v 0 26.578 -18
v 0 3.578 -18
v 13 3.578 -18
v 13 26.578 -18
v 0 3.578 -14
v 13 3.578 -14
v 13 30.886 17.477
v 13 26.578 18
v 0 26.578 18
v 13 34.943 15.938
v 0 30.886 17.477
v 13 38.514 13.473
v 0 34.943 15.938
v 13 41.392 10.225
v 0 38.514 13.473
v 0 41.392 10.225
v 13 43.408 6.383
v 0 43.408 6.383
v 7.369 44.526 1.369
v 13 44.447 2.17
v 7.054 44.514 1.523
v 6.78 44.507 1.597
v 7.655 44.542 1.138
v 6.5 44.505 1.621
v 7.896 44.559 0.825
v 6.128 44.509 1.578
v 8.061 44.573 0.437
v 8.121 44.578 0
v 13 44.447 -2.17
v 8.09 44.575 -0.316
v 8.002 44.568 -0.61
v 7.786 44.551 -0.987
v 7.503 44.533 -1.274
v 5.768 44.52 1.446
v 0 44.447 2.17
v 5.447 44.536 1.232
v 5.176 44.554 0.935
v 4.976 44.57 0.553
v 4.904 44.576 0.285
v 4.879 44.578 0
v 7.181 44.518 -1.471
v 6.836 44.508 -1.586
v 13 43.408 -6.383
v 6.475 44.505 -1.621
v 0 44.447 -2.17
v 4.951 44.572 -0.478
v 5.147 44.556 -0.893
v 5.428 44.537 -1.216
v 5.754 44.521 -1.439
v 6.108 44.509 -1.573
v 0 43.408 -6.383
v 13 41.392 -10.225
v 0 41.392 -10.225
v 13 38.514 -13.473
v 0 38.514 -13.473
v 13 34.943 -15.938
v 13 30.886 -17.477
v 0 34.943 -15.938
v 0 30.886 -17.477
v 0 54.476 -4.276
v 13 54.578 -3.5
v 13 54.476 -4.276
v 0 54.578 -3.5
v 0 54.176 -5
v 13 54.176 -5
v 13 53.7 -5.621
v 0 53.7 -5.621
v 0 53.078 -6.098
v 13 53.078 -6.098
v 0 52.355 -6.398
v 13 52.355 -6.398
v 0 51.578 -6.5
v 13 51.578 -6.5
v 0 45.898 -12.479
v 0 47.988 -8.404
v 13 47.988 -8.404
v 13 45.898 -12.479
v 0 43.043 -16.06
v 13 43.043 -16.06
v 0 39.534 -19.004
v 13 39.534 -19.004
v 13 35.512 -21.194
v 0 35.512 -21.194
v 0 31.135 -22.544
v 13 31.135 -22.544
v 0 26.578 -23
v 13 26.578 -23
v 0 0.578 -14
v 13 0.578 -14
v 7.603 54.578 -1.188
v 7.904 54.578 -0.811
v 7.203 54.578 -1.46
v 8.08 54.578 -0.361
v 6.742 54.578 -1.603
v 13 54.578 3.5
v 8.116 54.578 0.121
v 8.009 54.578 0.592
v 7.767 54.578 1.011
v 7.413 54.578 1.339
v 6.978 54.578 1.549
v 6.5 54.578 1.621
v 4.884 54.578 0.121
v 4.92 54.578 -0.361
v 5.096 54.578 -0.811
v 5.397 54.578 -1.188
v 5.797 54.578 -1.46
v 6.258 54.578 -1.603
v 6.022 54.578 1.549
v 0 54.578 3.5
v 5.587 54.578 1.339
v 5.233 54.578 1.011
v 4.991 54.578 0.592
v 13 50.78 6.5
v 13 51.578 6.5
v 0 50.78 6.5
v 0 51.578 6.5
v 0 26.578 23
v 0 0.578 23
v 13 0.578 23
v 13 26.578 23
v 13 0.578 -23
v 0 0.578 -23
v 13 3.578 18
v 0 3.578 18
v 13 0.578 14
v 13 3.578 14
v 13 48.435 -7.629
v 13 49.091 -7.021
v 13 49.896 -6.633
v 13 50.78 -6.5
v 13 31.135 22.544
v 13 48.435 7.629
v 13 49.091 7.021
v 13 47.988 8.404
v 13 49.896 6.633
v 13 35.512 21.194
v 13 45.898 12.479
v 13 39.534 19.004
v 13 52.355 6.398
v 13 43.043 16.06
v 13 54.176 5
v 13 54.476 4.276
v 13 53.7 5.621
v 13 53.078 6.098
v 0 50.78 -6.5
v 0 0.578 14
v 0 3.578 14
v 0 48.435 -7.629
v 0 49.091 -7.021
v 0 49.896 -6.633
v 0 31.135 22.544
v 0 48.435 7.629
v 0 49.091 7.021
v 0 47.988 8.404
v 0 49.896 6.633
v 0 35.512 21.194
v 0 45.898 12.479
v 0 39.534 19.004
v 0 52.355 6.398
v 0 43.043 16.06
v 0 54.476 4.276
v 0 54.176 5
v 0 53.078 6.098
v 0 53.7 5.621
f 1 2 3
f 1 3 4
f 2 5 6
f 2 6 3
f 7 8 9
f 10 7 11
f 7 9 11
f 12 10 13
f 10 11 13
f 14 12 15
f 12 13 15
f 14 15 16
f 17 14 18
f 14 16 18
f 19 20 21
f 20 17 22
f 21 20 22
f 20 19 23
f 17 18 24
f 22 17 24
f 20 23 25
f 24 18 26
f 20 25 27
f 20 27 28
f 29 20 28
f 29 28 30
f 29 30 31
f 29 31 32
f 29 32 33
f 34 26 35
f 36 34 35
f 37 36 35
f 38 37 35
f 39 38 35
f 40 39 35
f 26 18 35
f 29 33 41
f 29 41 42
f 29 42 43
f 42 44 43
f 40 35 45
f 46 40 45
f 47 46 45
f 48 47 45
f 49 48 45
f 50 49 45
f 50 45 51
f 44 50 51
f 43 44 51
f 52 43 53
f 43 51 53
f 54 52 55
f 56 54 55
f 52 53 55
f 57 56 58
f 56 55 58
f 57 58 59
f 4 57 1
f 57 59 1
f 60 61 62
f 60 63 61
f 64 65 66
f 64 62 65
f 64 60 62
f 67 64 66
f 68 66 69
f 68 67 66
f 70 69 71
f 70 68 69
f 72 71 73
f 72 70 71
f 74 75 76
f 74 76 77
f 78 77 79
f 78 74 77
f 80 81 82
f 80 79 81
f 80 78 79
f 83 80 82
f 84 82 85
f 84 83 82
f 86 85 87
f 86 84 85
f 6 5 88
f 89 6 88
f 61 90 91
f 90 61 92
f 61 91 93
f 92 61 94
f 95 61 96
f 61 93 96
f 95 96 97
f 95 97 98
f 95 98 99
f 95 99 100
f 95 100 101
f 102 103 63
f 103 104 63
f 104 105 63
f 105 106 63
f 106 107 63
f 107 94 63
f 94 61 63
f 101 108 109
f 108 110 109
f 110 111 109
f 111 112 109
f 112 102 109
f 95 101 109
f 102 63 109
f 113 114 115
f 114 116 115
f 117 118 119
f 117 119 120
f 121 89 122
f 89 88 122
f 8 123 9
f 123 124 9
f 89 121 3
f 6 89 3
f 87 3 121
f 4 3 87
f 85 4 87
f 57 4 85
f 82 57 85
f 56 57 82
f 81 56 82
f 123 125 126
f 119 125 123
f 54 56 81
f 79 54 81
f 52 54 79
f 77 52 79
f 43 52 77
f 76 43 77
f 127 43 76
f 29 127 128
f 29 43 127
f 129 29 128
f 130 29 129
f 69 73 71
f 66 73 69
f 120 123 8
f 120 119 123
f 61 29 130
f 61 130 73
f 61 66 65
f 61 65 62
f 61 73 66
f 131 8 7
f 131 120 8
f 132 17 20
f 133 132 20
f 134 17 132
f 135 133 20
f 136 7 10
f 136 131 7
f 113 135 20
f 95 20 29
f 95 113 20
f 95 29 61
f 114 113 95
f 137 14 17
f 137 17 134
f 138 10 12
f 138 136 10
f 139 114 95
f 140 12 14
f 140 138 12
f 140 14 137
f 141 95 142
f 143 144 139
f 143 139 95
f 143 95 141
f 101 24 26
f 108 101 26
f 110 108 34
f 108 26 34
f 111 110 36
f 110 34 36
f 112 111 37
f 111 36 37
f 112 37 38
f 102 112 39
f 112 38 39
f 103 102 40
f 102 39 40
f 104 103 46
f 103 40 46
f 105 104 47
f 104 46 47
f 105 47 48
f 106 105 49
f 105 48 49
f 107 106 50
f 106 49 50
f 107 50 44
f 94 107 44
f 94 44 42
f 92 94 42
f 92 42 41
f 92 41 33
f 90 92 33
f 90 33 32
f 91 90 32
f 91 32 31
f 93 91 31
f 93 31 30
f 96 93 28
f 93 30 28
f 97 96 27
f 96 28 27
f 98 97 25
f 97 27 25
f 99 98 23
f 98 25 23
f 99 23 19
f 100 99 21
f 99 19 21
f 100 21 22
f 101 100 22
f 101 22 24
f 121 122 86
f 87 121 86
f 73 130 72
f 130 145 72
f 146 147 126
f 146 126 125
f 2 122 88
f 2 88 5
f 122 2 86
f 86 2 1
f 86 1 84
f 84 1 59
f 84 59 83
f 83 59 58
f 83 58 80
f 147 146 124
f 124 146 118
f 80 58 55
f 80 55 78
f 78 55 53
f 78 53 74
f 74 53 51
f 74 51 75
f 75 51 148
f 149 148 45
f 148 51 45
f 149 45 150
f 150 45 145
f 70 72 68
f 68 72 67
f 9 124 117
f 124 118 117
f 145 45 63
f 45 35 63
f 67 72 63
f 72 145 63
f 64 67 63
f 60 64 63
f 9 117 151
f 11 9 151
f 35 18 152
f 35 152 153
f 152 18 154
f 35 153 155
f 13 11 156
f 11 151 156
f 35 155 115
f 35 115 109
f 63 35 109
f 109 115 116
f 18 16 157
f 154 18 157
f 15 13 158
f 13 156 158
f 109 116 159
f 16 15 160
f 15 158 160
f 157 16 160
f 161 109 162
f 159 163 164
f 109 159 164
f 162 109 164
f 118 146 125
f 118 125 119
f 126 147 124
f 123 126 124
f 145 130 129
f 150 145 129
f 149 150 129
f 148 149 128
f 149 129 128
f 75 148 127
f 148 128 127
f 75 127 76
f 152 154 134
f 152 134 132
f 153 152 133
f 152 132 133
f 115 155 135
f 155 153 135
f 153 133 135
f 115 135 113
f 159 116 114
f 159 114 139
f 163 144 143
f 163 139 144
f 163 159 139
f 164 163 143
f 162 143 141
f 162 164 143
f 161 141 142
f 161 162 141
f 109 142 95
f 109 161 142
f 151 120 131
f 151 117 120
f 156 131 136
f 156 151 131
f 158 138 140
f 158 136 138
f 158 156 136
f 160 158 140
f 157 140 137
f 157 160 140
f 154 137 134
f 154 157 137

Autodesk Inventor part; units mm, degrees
ref_plane "YZ Plane" through (0, 0, 0) normal (1, 0, 0) x (0, 1, 0)
ref_plane "XZ Plane" through (0, 0, 0) normal (0, 1, 0) x (-1, 0, 0)
ref_plane "XY Plane" through (0, 0, 0) normal (0, 0, 1) x (1, 0, 0)
sketch "Szkic1" plane through (0, 0, 0) normal (1, 0, 0) x (0, 1, 0)
  line L0 (3.5782, 14) -> (0.5782, 14)
  line L1 (0.5782, 14) -> (0.5782, 23)
  line L2 (0.5782, 23) -> (26.5782, 23)
  arc A0 (49.5782, 0) -> (26.5782, 23) centre (26.5782, 0) ccw
  line L3 (3.5782, 14) -> (3.5782, 18)
  line L4 (3.5782, 18) -> (26.5782, 18)
  arc A1 (44.5782, 0) -> (26.5782, 18) centre (26.5782, 0) ccw
  line L5 (3.5782, -14) -> (0.5782, -14)
  line L6 (0.5782, -14) -> (0.5782, -23)
  line L7 (0.5782, -23) -> (26.5782, -23)
  arc A2 (26.5782, -23) -> (49.5782, 0) centre (26.5782, 0) ccw
  line L8 (3.5782, -14) -> (3.5782, -18)
  line L9 (3.5782, -18) -> (26.5782, -18)
  arc A3 (26.5782, -18) -> (44.5782, 0) centre (26.5782, 0) ccw
  line L10 (51.5782, 6.5) -> (44.5782, 6.5)
  line L11 (44.5782, 6.5) -> (44.5782, -6.5)
  line L12 (44.5782, -6.5) -> (51.5782, -6.5)
  line L13 (54.5782, -3.5) -> (54.5782, 3.5)
  arc A4 (54.5782, 3.5) -> (51.5782, 6.5) centre (51.5782, 3.5) ccw
  arc A5 (51.5782, -6.5) -> (54.5782, -3.5) centre (51.5782, -3.5) ccw
  point P0 (0, 0)
  point P1 (2.0782, 14)
  point P2 (3.5782, 16)
  point P3 (2.0782, -14)
  point P4 (0.5782, 18.5)
  point P5 (48.6406, -6.5)
  point P6 (48.6406, 6.5)
  dimension "d0" = 9
  dimension "d2" = 5
  dimension "d3" = 3
  dimension "d4" = 23
  dimension "d5" = 14
  dimension "d6" = 14
  dimension "d7" = 13
  dimension "d8" = 54
  dimension "d9" = 3
  dimension "d10" = 3
sketch "Szkic2" plane through (0, 0, 0) normal (1, 0, 0) x (0, 1, 0)
  point P0 (0, 0)
extrude "Wyciągnięcie proste1" add sketch "Szkic1" along normal blind 13
fillet "Zaokrąglenie1" radius 3 1 edges at (6.5, 48.6406, -6.5)
fillet "Zaokrąglenie2" radius 3 1 edges at (6.5, 48.6406, 6.5)
sketch "Szkic3" plane through (0, 54.5782, 3.5) normal (0, 1, 0) x (1, 0, 0)
  point P0 (0, 3.5)
  point P1 (6.5, 3.5)
hole "Otwór1" at (6.5, 54.5782, 0) direction (0, -1, 0) diameter 3.242 end through all thread size "M4x0.7" class "6H" standard "ANSI Metric M Profile"
